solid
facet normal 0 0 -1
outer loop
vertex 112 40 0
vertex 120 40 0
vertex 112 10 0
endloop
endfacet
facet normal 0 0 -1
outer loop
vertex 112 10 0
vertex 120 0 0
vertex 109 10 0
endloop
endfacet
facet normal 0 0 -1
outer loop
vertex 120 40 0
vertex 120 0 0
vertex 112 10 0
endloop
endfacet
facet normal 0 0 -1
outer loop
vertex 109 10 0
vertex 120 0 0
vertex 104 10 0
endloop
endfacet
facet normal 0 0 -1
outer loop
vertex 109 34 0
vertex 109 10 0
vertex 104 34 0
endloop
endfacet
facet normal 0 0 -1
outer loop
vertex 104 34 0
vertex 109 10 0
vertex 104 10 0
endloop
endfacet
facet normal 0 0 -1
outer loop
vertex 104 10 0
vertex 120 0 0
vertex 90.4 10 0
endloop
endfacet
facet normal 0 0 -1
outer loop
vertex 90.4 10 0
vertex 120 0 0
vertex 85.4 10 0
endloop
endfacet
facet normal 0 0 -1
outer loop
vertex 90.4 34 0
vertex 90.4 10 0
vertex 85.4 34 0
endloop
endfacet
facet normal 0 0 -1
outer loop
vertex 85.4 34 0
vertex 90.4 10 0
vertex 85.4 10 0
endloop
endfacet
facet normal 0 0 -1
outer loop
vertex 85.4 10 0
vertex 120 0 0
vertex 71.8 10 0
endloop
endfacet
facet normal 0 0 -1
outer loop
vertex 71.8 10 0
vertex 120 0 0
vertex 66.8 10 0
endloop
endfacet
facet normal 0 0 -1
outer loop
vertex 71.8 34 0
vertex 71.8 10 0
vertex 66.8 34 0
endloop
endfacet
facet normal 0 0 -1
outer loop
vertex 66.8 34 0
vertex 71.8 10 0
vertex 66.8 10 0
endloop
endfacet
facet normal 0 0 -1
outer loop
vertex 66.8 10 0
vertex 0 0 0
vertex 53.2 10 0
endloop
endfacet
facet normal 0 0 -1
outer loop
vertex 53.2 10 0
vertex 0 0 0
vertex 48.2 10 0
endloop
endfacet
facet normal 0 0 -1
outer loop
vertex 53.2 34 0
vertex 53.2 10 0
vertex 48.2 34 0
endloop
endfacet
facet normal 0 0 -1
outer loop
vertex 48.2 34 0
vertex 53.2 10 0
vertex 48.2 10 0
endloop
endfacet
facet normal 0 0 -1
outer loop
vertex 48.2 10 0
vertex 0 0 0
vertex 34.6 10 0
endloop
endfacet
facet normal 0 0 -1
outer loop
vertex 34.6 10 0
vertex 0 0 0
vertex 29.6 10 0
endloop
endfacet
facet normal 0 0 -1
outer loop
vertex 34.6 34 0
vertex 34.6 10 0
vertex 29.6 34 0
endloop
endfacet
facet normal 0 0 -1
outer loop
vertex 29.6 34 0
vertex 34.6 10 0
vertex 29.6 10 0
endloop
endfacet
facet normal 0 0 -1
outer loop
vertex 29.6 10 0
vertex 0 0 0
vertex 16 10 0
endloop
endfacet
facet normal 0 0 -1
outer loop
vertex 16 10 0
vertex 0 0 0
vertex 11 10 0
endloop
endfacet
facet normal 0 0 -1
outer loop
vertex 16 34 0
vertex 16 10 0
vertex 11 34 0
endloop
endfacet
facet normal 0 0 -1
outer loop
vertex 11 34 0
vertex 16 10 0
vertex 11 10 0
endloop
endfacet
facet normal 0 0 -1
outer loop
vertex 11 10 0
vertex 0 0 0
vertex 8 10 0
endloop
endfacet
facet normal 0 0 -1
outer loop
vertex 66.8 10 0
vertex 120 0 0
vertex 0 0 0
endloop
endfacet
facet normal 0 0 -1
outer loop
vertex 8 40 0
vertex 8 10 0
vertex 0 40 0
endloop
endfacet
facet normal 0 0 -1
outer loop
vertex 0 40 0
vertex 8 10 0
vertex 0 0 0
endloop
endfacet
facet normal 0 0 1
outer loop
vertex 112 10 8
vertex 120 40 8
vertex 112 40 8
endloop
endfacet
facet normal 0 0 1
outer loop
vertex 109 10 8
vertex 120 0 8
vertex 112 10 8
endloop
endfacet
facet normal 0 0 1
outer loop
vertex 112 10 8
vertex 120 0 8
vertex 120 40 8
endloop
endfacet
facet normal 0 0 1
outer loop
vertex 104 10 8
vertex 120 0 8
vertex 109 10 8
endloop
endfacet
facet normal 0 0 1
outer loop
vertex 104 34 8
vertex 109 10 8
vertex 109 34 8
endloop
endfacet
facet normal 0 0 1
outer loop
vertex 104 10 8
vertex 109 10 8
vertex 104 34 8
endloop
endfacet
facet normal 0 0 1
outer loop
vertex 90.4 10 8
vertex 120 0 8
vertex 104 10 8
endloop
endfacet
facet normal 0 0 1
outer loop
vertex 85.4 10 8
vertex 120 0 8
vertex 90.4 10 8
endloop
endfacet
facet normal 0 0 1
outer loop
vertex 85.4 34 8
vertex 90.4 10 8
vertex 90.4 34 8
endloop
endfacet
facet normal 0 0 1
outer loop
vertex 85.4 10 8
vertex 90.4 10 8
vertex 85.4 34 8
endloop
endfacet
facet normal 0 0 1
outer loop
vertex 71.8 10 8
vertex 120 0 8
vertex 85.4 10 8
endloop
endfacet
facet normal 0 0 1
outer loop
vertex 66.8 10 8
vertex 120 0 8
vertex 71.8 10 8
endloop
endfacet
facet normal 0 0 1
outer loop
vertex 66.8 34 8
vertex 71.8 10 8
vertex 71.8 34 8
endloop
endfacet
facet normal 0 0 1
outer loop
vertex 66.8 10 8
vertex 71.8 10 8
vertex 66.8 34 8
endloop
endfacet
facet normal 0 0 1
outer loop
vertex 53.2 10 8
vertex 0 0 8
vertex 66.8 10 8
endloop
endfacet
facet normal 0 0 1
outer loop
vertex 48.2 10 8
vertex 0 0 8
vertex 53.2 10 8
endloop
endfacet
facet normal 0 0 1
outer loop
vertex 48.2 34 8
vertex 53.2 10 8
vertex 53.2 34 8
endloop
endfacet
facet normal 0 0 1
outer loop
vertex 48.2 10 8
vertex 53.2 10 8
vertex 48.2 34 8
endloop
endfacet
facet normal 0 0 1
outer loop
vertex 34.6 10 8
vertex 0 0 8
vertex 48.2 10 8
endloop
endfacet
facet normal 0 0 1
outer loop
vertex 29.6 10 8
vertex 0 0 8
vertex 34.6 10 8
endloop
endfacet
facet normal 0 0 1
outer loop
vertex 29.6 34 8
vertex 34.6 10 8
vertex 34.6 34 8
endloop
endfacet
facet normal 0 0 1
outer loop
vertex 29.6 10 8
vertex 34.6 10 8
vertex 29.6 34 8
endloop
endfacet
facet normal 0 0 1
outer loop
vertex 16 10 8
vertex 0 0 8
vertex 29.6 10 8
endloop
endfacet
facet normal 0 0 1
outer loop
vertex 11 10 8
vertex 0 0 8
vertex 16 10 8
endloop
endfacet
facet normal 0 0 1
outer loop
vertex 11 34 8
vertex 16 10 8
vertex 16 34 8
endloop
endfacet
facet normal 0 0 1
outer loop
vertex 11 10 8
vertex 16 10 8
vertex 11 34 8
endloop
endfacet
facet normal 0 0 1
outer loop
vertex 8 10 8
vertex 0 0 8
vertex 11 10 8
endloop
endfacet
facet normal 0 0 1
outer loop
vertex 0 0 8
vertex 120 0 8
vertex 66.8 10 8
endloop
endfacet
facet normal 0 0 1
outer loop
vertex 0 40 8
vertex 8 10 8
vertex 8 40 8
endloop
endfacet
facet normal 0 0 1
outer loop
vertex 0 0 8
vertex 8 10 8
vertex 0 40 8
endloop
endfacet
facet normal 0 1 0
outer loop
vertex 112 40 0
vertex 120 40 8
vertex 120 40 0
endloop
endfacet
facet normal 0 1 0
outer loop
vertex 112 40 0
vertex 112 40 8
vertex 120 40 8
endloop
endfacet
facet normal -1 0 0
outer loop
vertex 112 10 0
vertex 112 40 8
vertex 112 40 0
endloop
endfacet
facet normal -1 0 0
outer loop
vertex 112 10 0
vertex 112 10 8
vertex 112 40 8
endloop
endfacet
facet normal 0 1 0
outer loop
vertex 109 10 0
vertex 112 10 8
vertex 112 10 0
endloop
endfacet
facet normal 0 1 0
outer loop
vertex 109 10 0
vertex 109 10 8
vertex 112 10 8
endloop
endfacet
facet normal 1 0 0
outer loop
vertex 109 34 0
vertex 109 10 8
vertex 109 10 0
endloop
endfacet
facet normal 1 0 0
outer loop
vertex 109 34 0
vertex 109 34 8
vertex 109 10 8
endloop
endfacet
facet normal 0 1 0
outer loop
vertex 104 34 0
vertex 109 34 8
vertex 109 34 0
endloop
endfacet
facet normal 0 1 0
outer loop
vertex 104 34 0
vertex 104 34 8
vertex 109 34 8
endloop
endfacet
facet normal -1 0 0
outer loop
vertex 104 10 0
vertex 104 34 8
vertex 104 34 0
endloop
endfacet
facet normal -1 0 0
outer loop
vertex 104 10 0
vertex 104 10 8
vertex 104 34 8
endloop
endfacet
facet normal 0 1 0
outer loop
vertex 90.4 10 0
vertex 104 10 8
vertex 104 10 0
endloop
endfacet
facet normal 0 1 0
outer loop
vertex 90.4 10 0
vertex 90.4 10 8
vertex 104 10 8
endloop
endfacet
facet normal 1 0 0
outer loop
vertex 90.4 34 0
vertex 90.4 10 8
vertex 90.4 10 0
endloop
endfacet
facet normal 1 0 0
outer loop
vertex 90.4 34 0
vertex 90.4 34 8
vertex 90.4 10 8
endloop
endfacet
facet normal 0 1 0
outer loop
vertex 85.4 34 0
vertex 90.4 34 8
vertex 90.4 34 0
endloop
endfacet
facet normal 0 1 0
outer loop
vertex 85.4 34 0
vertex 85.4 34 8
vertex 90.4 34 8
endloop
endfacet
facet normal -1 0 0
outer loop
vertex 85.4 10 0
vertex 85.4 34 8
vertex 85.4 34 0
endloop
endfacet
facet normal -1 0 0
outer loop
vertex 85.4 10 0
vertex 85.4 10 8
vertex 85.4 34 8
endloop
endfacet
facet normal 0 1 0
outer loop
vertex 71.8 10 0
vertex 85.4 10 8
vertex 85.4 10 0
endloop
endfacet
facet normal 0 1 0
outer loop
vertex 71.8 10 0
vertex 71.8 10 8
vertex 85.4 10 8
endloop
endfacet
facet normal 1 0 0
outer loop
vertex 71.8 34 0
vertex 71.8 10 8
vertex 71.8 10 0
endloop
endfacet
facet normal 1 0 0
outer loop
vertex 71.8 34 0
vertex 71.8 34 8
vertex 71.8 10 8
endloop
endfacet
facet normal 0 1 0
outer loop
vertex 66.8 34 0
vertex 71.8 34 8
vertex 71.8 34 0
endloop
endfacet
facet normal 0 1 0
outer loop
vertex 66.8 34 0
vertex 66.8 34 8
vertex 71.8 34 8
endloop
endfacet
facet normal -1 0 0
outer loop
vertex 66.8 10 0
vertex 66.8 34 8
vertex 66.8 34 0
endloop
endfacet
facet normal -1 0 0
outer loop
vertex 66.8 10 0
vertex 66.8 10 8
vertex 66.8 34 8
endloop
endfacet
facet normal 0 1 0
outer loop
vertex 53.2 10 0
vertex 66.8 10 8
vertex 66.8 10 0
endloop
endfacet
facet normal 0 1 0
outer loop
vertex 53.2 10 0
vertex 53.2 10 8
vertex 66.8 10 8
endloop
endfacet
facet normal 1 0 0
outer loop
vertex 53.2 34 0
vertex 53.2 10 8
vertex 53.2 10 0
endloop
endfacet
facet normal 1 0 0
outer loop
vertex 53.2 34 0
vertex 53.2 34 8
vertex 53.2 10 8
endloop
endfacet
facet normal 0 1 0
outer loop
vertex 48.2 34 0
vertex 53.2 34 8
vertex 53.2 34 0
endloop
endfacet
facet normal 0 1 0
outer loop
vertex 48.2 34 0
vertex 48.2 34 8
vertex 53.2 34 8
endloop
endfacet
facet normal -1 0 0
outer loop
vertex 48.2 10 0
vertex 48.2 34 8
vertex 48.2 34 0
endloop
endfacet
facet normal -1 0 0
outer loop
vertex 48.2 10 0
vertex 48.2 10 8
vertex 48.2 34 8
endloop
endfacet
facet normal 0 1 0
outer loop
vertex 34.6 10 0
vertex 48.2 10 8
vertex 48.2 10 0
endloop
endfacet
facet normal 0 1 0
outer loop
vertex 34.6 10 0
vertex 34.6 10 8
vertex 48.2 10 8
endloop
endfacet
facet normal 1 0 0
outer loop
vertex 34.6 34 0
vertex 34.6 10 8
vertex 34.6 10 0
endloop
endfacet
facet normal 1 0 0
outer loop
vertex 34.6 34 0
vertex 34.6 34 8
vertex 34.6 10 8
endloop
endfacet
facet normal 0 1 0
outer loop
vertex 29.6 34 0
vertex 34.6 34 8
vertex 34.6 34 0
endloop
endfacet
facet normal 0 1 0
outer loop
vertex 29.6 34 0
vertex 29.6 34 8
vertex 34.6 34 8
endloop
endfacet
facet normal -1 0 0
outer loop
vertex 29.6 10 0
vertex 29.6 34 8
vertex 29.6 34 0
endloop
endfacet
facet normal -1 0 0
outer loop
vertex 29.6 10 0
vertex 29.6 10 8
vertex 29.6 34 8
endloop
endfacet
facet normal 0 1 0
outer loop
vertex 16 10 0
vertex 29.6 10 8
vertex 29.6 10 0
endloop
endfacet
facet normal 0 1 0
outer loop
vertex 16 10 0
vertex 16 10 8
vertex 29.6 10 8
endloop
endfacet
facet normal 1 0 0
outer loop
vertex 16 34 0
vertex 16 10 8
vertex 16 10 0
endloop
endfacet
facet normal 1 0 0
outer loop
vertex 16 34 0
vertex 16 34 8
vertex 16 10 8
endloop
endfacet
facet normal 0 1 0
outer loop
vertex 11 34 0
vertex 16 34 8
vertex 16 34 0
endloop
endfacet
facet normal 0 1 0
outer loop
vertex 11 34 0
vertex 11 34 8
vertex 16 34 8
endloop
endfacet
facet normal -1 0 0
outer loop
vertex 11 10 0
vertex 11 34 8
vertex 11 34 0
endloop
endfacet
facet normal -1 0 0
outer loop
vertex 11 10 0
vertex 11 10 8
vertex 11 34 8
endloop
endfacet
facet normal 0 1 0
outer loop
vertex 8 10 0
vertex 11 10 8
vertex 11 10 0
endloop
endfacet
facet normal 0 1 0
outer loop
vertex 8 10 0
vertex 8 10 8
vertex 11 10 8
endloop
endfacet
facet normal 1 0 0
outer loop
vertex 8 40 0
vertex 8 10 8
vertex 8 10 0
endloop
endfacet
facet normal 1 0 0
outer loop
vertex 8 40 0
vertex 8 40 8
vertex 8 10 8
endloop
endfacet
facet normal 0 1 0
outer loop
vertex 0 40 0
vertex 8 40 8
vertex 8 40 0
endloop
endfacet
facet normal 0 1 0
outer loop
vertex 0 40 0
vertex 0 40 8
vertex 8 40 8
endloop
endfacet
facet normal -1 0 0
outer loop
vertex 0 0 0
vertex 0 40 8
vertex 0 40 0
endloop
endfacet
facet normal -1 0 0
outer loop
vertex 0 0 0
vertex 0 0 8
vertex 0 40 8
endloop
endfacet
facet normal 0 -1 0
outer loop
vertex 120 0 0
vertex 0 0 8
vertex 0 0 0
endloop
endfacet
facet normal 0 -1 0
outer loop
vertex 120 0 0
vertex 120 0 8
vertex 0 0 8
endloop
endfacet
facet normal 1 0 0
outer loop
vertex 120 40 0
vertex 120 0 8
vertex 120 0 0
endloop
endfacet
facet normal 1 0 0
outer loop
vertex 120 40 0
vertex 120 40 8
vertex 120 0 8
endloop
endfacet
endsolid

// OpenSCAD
$fn = 32;

// ----------------------------------------------------------------------
// Guard grille: 6 slats over a 120 x 40 mm plate
// ----------------------------------------------------------------------

// --- parameters (mm) ---
profile_height = 8;       // extrusion height
profile_points = 32;      // points of the closed outline

profile = [[0, 0], [120, 0], [120, 40], [112, 40], [112, 10], [109, 10], [109, 34], [104, 34], [104, 10], [90.4, 10], [90.4, 34], [85.4, 34], [85.4, 10], [71.8, 10], [71.8, 34], [66.8, 34], [66.8, 10], [53.2, 10], [53.2, 34], [48.2, 34], [48.2, 10], [34.6, 10], [34.6, 34], [29.6, 34], [29.6, 10], [16, 10], [16, 34], [11, 34], [11, 10], [8, 10], [8, 40], [0, 40]];  // single closed polygon, 32 points, counter clockwise

// --- the one profile operation ---
linear_extrude(height = profile_height) polygon(points = profile);
